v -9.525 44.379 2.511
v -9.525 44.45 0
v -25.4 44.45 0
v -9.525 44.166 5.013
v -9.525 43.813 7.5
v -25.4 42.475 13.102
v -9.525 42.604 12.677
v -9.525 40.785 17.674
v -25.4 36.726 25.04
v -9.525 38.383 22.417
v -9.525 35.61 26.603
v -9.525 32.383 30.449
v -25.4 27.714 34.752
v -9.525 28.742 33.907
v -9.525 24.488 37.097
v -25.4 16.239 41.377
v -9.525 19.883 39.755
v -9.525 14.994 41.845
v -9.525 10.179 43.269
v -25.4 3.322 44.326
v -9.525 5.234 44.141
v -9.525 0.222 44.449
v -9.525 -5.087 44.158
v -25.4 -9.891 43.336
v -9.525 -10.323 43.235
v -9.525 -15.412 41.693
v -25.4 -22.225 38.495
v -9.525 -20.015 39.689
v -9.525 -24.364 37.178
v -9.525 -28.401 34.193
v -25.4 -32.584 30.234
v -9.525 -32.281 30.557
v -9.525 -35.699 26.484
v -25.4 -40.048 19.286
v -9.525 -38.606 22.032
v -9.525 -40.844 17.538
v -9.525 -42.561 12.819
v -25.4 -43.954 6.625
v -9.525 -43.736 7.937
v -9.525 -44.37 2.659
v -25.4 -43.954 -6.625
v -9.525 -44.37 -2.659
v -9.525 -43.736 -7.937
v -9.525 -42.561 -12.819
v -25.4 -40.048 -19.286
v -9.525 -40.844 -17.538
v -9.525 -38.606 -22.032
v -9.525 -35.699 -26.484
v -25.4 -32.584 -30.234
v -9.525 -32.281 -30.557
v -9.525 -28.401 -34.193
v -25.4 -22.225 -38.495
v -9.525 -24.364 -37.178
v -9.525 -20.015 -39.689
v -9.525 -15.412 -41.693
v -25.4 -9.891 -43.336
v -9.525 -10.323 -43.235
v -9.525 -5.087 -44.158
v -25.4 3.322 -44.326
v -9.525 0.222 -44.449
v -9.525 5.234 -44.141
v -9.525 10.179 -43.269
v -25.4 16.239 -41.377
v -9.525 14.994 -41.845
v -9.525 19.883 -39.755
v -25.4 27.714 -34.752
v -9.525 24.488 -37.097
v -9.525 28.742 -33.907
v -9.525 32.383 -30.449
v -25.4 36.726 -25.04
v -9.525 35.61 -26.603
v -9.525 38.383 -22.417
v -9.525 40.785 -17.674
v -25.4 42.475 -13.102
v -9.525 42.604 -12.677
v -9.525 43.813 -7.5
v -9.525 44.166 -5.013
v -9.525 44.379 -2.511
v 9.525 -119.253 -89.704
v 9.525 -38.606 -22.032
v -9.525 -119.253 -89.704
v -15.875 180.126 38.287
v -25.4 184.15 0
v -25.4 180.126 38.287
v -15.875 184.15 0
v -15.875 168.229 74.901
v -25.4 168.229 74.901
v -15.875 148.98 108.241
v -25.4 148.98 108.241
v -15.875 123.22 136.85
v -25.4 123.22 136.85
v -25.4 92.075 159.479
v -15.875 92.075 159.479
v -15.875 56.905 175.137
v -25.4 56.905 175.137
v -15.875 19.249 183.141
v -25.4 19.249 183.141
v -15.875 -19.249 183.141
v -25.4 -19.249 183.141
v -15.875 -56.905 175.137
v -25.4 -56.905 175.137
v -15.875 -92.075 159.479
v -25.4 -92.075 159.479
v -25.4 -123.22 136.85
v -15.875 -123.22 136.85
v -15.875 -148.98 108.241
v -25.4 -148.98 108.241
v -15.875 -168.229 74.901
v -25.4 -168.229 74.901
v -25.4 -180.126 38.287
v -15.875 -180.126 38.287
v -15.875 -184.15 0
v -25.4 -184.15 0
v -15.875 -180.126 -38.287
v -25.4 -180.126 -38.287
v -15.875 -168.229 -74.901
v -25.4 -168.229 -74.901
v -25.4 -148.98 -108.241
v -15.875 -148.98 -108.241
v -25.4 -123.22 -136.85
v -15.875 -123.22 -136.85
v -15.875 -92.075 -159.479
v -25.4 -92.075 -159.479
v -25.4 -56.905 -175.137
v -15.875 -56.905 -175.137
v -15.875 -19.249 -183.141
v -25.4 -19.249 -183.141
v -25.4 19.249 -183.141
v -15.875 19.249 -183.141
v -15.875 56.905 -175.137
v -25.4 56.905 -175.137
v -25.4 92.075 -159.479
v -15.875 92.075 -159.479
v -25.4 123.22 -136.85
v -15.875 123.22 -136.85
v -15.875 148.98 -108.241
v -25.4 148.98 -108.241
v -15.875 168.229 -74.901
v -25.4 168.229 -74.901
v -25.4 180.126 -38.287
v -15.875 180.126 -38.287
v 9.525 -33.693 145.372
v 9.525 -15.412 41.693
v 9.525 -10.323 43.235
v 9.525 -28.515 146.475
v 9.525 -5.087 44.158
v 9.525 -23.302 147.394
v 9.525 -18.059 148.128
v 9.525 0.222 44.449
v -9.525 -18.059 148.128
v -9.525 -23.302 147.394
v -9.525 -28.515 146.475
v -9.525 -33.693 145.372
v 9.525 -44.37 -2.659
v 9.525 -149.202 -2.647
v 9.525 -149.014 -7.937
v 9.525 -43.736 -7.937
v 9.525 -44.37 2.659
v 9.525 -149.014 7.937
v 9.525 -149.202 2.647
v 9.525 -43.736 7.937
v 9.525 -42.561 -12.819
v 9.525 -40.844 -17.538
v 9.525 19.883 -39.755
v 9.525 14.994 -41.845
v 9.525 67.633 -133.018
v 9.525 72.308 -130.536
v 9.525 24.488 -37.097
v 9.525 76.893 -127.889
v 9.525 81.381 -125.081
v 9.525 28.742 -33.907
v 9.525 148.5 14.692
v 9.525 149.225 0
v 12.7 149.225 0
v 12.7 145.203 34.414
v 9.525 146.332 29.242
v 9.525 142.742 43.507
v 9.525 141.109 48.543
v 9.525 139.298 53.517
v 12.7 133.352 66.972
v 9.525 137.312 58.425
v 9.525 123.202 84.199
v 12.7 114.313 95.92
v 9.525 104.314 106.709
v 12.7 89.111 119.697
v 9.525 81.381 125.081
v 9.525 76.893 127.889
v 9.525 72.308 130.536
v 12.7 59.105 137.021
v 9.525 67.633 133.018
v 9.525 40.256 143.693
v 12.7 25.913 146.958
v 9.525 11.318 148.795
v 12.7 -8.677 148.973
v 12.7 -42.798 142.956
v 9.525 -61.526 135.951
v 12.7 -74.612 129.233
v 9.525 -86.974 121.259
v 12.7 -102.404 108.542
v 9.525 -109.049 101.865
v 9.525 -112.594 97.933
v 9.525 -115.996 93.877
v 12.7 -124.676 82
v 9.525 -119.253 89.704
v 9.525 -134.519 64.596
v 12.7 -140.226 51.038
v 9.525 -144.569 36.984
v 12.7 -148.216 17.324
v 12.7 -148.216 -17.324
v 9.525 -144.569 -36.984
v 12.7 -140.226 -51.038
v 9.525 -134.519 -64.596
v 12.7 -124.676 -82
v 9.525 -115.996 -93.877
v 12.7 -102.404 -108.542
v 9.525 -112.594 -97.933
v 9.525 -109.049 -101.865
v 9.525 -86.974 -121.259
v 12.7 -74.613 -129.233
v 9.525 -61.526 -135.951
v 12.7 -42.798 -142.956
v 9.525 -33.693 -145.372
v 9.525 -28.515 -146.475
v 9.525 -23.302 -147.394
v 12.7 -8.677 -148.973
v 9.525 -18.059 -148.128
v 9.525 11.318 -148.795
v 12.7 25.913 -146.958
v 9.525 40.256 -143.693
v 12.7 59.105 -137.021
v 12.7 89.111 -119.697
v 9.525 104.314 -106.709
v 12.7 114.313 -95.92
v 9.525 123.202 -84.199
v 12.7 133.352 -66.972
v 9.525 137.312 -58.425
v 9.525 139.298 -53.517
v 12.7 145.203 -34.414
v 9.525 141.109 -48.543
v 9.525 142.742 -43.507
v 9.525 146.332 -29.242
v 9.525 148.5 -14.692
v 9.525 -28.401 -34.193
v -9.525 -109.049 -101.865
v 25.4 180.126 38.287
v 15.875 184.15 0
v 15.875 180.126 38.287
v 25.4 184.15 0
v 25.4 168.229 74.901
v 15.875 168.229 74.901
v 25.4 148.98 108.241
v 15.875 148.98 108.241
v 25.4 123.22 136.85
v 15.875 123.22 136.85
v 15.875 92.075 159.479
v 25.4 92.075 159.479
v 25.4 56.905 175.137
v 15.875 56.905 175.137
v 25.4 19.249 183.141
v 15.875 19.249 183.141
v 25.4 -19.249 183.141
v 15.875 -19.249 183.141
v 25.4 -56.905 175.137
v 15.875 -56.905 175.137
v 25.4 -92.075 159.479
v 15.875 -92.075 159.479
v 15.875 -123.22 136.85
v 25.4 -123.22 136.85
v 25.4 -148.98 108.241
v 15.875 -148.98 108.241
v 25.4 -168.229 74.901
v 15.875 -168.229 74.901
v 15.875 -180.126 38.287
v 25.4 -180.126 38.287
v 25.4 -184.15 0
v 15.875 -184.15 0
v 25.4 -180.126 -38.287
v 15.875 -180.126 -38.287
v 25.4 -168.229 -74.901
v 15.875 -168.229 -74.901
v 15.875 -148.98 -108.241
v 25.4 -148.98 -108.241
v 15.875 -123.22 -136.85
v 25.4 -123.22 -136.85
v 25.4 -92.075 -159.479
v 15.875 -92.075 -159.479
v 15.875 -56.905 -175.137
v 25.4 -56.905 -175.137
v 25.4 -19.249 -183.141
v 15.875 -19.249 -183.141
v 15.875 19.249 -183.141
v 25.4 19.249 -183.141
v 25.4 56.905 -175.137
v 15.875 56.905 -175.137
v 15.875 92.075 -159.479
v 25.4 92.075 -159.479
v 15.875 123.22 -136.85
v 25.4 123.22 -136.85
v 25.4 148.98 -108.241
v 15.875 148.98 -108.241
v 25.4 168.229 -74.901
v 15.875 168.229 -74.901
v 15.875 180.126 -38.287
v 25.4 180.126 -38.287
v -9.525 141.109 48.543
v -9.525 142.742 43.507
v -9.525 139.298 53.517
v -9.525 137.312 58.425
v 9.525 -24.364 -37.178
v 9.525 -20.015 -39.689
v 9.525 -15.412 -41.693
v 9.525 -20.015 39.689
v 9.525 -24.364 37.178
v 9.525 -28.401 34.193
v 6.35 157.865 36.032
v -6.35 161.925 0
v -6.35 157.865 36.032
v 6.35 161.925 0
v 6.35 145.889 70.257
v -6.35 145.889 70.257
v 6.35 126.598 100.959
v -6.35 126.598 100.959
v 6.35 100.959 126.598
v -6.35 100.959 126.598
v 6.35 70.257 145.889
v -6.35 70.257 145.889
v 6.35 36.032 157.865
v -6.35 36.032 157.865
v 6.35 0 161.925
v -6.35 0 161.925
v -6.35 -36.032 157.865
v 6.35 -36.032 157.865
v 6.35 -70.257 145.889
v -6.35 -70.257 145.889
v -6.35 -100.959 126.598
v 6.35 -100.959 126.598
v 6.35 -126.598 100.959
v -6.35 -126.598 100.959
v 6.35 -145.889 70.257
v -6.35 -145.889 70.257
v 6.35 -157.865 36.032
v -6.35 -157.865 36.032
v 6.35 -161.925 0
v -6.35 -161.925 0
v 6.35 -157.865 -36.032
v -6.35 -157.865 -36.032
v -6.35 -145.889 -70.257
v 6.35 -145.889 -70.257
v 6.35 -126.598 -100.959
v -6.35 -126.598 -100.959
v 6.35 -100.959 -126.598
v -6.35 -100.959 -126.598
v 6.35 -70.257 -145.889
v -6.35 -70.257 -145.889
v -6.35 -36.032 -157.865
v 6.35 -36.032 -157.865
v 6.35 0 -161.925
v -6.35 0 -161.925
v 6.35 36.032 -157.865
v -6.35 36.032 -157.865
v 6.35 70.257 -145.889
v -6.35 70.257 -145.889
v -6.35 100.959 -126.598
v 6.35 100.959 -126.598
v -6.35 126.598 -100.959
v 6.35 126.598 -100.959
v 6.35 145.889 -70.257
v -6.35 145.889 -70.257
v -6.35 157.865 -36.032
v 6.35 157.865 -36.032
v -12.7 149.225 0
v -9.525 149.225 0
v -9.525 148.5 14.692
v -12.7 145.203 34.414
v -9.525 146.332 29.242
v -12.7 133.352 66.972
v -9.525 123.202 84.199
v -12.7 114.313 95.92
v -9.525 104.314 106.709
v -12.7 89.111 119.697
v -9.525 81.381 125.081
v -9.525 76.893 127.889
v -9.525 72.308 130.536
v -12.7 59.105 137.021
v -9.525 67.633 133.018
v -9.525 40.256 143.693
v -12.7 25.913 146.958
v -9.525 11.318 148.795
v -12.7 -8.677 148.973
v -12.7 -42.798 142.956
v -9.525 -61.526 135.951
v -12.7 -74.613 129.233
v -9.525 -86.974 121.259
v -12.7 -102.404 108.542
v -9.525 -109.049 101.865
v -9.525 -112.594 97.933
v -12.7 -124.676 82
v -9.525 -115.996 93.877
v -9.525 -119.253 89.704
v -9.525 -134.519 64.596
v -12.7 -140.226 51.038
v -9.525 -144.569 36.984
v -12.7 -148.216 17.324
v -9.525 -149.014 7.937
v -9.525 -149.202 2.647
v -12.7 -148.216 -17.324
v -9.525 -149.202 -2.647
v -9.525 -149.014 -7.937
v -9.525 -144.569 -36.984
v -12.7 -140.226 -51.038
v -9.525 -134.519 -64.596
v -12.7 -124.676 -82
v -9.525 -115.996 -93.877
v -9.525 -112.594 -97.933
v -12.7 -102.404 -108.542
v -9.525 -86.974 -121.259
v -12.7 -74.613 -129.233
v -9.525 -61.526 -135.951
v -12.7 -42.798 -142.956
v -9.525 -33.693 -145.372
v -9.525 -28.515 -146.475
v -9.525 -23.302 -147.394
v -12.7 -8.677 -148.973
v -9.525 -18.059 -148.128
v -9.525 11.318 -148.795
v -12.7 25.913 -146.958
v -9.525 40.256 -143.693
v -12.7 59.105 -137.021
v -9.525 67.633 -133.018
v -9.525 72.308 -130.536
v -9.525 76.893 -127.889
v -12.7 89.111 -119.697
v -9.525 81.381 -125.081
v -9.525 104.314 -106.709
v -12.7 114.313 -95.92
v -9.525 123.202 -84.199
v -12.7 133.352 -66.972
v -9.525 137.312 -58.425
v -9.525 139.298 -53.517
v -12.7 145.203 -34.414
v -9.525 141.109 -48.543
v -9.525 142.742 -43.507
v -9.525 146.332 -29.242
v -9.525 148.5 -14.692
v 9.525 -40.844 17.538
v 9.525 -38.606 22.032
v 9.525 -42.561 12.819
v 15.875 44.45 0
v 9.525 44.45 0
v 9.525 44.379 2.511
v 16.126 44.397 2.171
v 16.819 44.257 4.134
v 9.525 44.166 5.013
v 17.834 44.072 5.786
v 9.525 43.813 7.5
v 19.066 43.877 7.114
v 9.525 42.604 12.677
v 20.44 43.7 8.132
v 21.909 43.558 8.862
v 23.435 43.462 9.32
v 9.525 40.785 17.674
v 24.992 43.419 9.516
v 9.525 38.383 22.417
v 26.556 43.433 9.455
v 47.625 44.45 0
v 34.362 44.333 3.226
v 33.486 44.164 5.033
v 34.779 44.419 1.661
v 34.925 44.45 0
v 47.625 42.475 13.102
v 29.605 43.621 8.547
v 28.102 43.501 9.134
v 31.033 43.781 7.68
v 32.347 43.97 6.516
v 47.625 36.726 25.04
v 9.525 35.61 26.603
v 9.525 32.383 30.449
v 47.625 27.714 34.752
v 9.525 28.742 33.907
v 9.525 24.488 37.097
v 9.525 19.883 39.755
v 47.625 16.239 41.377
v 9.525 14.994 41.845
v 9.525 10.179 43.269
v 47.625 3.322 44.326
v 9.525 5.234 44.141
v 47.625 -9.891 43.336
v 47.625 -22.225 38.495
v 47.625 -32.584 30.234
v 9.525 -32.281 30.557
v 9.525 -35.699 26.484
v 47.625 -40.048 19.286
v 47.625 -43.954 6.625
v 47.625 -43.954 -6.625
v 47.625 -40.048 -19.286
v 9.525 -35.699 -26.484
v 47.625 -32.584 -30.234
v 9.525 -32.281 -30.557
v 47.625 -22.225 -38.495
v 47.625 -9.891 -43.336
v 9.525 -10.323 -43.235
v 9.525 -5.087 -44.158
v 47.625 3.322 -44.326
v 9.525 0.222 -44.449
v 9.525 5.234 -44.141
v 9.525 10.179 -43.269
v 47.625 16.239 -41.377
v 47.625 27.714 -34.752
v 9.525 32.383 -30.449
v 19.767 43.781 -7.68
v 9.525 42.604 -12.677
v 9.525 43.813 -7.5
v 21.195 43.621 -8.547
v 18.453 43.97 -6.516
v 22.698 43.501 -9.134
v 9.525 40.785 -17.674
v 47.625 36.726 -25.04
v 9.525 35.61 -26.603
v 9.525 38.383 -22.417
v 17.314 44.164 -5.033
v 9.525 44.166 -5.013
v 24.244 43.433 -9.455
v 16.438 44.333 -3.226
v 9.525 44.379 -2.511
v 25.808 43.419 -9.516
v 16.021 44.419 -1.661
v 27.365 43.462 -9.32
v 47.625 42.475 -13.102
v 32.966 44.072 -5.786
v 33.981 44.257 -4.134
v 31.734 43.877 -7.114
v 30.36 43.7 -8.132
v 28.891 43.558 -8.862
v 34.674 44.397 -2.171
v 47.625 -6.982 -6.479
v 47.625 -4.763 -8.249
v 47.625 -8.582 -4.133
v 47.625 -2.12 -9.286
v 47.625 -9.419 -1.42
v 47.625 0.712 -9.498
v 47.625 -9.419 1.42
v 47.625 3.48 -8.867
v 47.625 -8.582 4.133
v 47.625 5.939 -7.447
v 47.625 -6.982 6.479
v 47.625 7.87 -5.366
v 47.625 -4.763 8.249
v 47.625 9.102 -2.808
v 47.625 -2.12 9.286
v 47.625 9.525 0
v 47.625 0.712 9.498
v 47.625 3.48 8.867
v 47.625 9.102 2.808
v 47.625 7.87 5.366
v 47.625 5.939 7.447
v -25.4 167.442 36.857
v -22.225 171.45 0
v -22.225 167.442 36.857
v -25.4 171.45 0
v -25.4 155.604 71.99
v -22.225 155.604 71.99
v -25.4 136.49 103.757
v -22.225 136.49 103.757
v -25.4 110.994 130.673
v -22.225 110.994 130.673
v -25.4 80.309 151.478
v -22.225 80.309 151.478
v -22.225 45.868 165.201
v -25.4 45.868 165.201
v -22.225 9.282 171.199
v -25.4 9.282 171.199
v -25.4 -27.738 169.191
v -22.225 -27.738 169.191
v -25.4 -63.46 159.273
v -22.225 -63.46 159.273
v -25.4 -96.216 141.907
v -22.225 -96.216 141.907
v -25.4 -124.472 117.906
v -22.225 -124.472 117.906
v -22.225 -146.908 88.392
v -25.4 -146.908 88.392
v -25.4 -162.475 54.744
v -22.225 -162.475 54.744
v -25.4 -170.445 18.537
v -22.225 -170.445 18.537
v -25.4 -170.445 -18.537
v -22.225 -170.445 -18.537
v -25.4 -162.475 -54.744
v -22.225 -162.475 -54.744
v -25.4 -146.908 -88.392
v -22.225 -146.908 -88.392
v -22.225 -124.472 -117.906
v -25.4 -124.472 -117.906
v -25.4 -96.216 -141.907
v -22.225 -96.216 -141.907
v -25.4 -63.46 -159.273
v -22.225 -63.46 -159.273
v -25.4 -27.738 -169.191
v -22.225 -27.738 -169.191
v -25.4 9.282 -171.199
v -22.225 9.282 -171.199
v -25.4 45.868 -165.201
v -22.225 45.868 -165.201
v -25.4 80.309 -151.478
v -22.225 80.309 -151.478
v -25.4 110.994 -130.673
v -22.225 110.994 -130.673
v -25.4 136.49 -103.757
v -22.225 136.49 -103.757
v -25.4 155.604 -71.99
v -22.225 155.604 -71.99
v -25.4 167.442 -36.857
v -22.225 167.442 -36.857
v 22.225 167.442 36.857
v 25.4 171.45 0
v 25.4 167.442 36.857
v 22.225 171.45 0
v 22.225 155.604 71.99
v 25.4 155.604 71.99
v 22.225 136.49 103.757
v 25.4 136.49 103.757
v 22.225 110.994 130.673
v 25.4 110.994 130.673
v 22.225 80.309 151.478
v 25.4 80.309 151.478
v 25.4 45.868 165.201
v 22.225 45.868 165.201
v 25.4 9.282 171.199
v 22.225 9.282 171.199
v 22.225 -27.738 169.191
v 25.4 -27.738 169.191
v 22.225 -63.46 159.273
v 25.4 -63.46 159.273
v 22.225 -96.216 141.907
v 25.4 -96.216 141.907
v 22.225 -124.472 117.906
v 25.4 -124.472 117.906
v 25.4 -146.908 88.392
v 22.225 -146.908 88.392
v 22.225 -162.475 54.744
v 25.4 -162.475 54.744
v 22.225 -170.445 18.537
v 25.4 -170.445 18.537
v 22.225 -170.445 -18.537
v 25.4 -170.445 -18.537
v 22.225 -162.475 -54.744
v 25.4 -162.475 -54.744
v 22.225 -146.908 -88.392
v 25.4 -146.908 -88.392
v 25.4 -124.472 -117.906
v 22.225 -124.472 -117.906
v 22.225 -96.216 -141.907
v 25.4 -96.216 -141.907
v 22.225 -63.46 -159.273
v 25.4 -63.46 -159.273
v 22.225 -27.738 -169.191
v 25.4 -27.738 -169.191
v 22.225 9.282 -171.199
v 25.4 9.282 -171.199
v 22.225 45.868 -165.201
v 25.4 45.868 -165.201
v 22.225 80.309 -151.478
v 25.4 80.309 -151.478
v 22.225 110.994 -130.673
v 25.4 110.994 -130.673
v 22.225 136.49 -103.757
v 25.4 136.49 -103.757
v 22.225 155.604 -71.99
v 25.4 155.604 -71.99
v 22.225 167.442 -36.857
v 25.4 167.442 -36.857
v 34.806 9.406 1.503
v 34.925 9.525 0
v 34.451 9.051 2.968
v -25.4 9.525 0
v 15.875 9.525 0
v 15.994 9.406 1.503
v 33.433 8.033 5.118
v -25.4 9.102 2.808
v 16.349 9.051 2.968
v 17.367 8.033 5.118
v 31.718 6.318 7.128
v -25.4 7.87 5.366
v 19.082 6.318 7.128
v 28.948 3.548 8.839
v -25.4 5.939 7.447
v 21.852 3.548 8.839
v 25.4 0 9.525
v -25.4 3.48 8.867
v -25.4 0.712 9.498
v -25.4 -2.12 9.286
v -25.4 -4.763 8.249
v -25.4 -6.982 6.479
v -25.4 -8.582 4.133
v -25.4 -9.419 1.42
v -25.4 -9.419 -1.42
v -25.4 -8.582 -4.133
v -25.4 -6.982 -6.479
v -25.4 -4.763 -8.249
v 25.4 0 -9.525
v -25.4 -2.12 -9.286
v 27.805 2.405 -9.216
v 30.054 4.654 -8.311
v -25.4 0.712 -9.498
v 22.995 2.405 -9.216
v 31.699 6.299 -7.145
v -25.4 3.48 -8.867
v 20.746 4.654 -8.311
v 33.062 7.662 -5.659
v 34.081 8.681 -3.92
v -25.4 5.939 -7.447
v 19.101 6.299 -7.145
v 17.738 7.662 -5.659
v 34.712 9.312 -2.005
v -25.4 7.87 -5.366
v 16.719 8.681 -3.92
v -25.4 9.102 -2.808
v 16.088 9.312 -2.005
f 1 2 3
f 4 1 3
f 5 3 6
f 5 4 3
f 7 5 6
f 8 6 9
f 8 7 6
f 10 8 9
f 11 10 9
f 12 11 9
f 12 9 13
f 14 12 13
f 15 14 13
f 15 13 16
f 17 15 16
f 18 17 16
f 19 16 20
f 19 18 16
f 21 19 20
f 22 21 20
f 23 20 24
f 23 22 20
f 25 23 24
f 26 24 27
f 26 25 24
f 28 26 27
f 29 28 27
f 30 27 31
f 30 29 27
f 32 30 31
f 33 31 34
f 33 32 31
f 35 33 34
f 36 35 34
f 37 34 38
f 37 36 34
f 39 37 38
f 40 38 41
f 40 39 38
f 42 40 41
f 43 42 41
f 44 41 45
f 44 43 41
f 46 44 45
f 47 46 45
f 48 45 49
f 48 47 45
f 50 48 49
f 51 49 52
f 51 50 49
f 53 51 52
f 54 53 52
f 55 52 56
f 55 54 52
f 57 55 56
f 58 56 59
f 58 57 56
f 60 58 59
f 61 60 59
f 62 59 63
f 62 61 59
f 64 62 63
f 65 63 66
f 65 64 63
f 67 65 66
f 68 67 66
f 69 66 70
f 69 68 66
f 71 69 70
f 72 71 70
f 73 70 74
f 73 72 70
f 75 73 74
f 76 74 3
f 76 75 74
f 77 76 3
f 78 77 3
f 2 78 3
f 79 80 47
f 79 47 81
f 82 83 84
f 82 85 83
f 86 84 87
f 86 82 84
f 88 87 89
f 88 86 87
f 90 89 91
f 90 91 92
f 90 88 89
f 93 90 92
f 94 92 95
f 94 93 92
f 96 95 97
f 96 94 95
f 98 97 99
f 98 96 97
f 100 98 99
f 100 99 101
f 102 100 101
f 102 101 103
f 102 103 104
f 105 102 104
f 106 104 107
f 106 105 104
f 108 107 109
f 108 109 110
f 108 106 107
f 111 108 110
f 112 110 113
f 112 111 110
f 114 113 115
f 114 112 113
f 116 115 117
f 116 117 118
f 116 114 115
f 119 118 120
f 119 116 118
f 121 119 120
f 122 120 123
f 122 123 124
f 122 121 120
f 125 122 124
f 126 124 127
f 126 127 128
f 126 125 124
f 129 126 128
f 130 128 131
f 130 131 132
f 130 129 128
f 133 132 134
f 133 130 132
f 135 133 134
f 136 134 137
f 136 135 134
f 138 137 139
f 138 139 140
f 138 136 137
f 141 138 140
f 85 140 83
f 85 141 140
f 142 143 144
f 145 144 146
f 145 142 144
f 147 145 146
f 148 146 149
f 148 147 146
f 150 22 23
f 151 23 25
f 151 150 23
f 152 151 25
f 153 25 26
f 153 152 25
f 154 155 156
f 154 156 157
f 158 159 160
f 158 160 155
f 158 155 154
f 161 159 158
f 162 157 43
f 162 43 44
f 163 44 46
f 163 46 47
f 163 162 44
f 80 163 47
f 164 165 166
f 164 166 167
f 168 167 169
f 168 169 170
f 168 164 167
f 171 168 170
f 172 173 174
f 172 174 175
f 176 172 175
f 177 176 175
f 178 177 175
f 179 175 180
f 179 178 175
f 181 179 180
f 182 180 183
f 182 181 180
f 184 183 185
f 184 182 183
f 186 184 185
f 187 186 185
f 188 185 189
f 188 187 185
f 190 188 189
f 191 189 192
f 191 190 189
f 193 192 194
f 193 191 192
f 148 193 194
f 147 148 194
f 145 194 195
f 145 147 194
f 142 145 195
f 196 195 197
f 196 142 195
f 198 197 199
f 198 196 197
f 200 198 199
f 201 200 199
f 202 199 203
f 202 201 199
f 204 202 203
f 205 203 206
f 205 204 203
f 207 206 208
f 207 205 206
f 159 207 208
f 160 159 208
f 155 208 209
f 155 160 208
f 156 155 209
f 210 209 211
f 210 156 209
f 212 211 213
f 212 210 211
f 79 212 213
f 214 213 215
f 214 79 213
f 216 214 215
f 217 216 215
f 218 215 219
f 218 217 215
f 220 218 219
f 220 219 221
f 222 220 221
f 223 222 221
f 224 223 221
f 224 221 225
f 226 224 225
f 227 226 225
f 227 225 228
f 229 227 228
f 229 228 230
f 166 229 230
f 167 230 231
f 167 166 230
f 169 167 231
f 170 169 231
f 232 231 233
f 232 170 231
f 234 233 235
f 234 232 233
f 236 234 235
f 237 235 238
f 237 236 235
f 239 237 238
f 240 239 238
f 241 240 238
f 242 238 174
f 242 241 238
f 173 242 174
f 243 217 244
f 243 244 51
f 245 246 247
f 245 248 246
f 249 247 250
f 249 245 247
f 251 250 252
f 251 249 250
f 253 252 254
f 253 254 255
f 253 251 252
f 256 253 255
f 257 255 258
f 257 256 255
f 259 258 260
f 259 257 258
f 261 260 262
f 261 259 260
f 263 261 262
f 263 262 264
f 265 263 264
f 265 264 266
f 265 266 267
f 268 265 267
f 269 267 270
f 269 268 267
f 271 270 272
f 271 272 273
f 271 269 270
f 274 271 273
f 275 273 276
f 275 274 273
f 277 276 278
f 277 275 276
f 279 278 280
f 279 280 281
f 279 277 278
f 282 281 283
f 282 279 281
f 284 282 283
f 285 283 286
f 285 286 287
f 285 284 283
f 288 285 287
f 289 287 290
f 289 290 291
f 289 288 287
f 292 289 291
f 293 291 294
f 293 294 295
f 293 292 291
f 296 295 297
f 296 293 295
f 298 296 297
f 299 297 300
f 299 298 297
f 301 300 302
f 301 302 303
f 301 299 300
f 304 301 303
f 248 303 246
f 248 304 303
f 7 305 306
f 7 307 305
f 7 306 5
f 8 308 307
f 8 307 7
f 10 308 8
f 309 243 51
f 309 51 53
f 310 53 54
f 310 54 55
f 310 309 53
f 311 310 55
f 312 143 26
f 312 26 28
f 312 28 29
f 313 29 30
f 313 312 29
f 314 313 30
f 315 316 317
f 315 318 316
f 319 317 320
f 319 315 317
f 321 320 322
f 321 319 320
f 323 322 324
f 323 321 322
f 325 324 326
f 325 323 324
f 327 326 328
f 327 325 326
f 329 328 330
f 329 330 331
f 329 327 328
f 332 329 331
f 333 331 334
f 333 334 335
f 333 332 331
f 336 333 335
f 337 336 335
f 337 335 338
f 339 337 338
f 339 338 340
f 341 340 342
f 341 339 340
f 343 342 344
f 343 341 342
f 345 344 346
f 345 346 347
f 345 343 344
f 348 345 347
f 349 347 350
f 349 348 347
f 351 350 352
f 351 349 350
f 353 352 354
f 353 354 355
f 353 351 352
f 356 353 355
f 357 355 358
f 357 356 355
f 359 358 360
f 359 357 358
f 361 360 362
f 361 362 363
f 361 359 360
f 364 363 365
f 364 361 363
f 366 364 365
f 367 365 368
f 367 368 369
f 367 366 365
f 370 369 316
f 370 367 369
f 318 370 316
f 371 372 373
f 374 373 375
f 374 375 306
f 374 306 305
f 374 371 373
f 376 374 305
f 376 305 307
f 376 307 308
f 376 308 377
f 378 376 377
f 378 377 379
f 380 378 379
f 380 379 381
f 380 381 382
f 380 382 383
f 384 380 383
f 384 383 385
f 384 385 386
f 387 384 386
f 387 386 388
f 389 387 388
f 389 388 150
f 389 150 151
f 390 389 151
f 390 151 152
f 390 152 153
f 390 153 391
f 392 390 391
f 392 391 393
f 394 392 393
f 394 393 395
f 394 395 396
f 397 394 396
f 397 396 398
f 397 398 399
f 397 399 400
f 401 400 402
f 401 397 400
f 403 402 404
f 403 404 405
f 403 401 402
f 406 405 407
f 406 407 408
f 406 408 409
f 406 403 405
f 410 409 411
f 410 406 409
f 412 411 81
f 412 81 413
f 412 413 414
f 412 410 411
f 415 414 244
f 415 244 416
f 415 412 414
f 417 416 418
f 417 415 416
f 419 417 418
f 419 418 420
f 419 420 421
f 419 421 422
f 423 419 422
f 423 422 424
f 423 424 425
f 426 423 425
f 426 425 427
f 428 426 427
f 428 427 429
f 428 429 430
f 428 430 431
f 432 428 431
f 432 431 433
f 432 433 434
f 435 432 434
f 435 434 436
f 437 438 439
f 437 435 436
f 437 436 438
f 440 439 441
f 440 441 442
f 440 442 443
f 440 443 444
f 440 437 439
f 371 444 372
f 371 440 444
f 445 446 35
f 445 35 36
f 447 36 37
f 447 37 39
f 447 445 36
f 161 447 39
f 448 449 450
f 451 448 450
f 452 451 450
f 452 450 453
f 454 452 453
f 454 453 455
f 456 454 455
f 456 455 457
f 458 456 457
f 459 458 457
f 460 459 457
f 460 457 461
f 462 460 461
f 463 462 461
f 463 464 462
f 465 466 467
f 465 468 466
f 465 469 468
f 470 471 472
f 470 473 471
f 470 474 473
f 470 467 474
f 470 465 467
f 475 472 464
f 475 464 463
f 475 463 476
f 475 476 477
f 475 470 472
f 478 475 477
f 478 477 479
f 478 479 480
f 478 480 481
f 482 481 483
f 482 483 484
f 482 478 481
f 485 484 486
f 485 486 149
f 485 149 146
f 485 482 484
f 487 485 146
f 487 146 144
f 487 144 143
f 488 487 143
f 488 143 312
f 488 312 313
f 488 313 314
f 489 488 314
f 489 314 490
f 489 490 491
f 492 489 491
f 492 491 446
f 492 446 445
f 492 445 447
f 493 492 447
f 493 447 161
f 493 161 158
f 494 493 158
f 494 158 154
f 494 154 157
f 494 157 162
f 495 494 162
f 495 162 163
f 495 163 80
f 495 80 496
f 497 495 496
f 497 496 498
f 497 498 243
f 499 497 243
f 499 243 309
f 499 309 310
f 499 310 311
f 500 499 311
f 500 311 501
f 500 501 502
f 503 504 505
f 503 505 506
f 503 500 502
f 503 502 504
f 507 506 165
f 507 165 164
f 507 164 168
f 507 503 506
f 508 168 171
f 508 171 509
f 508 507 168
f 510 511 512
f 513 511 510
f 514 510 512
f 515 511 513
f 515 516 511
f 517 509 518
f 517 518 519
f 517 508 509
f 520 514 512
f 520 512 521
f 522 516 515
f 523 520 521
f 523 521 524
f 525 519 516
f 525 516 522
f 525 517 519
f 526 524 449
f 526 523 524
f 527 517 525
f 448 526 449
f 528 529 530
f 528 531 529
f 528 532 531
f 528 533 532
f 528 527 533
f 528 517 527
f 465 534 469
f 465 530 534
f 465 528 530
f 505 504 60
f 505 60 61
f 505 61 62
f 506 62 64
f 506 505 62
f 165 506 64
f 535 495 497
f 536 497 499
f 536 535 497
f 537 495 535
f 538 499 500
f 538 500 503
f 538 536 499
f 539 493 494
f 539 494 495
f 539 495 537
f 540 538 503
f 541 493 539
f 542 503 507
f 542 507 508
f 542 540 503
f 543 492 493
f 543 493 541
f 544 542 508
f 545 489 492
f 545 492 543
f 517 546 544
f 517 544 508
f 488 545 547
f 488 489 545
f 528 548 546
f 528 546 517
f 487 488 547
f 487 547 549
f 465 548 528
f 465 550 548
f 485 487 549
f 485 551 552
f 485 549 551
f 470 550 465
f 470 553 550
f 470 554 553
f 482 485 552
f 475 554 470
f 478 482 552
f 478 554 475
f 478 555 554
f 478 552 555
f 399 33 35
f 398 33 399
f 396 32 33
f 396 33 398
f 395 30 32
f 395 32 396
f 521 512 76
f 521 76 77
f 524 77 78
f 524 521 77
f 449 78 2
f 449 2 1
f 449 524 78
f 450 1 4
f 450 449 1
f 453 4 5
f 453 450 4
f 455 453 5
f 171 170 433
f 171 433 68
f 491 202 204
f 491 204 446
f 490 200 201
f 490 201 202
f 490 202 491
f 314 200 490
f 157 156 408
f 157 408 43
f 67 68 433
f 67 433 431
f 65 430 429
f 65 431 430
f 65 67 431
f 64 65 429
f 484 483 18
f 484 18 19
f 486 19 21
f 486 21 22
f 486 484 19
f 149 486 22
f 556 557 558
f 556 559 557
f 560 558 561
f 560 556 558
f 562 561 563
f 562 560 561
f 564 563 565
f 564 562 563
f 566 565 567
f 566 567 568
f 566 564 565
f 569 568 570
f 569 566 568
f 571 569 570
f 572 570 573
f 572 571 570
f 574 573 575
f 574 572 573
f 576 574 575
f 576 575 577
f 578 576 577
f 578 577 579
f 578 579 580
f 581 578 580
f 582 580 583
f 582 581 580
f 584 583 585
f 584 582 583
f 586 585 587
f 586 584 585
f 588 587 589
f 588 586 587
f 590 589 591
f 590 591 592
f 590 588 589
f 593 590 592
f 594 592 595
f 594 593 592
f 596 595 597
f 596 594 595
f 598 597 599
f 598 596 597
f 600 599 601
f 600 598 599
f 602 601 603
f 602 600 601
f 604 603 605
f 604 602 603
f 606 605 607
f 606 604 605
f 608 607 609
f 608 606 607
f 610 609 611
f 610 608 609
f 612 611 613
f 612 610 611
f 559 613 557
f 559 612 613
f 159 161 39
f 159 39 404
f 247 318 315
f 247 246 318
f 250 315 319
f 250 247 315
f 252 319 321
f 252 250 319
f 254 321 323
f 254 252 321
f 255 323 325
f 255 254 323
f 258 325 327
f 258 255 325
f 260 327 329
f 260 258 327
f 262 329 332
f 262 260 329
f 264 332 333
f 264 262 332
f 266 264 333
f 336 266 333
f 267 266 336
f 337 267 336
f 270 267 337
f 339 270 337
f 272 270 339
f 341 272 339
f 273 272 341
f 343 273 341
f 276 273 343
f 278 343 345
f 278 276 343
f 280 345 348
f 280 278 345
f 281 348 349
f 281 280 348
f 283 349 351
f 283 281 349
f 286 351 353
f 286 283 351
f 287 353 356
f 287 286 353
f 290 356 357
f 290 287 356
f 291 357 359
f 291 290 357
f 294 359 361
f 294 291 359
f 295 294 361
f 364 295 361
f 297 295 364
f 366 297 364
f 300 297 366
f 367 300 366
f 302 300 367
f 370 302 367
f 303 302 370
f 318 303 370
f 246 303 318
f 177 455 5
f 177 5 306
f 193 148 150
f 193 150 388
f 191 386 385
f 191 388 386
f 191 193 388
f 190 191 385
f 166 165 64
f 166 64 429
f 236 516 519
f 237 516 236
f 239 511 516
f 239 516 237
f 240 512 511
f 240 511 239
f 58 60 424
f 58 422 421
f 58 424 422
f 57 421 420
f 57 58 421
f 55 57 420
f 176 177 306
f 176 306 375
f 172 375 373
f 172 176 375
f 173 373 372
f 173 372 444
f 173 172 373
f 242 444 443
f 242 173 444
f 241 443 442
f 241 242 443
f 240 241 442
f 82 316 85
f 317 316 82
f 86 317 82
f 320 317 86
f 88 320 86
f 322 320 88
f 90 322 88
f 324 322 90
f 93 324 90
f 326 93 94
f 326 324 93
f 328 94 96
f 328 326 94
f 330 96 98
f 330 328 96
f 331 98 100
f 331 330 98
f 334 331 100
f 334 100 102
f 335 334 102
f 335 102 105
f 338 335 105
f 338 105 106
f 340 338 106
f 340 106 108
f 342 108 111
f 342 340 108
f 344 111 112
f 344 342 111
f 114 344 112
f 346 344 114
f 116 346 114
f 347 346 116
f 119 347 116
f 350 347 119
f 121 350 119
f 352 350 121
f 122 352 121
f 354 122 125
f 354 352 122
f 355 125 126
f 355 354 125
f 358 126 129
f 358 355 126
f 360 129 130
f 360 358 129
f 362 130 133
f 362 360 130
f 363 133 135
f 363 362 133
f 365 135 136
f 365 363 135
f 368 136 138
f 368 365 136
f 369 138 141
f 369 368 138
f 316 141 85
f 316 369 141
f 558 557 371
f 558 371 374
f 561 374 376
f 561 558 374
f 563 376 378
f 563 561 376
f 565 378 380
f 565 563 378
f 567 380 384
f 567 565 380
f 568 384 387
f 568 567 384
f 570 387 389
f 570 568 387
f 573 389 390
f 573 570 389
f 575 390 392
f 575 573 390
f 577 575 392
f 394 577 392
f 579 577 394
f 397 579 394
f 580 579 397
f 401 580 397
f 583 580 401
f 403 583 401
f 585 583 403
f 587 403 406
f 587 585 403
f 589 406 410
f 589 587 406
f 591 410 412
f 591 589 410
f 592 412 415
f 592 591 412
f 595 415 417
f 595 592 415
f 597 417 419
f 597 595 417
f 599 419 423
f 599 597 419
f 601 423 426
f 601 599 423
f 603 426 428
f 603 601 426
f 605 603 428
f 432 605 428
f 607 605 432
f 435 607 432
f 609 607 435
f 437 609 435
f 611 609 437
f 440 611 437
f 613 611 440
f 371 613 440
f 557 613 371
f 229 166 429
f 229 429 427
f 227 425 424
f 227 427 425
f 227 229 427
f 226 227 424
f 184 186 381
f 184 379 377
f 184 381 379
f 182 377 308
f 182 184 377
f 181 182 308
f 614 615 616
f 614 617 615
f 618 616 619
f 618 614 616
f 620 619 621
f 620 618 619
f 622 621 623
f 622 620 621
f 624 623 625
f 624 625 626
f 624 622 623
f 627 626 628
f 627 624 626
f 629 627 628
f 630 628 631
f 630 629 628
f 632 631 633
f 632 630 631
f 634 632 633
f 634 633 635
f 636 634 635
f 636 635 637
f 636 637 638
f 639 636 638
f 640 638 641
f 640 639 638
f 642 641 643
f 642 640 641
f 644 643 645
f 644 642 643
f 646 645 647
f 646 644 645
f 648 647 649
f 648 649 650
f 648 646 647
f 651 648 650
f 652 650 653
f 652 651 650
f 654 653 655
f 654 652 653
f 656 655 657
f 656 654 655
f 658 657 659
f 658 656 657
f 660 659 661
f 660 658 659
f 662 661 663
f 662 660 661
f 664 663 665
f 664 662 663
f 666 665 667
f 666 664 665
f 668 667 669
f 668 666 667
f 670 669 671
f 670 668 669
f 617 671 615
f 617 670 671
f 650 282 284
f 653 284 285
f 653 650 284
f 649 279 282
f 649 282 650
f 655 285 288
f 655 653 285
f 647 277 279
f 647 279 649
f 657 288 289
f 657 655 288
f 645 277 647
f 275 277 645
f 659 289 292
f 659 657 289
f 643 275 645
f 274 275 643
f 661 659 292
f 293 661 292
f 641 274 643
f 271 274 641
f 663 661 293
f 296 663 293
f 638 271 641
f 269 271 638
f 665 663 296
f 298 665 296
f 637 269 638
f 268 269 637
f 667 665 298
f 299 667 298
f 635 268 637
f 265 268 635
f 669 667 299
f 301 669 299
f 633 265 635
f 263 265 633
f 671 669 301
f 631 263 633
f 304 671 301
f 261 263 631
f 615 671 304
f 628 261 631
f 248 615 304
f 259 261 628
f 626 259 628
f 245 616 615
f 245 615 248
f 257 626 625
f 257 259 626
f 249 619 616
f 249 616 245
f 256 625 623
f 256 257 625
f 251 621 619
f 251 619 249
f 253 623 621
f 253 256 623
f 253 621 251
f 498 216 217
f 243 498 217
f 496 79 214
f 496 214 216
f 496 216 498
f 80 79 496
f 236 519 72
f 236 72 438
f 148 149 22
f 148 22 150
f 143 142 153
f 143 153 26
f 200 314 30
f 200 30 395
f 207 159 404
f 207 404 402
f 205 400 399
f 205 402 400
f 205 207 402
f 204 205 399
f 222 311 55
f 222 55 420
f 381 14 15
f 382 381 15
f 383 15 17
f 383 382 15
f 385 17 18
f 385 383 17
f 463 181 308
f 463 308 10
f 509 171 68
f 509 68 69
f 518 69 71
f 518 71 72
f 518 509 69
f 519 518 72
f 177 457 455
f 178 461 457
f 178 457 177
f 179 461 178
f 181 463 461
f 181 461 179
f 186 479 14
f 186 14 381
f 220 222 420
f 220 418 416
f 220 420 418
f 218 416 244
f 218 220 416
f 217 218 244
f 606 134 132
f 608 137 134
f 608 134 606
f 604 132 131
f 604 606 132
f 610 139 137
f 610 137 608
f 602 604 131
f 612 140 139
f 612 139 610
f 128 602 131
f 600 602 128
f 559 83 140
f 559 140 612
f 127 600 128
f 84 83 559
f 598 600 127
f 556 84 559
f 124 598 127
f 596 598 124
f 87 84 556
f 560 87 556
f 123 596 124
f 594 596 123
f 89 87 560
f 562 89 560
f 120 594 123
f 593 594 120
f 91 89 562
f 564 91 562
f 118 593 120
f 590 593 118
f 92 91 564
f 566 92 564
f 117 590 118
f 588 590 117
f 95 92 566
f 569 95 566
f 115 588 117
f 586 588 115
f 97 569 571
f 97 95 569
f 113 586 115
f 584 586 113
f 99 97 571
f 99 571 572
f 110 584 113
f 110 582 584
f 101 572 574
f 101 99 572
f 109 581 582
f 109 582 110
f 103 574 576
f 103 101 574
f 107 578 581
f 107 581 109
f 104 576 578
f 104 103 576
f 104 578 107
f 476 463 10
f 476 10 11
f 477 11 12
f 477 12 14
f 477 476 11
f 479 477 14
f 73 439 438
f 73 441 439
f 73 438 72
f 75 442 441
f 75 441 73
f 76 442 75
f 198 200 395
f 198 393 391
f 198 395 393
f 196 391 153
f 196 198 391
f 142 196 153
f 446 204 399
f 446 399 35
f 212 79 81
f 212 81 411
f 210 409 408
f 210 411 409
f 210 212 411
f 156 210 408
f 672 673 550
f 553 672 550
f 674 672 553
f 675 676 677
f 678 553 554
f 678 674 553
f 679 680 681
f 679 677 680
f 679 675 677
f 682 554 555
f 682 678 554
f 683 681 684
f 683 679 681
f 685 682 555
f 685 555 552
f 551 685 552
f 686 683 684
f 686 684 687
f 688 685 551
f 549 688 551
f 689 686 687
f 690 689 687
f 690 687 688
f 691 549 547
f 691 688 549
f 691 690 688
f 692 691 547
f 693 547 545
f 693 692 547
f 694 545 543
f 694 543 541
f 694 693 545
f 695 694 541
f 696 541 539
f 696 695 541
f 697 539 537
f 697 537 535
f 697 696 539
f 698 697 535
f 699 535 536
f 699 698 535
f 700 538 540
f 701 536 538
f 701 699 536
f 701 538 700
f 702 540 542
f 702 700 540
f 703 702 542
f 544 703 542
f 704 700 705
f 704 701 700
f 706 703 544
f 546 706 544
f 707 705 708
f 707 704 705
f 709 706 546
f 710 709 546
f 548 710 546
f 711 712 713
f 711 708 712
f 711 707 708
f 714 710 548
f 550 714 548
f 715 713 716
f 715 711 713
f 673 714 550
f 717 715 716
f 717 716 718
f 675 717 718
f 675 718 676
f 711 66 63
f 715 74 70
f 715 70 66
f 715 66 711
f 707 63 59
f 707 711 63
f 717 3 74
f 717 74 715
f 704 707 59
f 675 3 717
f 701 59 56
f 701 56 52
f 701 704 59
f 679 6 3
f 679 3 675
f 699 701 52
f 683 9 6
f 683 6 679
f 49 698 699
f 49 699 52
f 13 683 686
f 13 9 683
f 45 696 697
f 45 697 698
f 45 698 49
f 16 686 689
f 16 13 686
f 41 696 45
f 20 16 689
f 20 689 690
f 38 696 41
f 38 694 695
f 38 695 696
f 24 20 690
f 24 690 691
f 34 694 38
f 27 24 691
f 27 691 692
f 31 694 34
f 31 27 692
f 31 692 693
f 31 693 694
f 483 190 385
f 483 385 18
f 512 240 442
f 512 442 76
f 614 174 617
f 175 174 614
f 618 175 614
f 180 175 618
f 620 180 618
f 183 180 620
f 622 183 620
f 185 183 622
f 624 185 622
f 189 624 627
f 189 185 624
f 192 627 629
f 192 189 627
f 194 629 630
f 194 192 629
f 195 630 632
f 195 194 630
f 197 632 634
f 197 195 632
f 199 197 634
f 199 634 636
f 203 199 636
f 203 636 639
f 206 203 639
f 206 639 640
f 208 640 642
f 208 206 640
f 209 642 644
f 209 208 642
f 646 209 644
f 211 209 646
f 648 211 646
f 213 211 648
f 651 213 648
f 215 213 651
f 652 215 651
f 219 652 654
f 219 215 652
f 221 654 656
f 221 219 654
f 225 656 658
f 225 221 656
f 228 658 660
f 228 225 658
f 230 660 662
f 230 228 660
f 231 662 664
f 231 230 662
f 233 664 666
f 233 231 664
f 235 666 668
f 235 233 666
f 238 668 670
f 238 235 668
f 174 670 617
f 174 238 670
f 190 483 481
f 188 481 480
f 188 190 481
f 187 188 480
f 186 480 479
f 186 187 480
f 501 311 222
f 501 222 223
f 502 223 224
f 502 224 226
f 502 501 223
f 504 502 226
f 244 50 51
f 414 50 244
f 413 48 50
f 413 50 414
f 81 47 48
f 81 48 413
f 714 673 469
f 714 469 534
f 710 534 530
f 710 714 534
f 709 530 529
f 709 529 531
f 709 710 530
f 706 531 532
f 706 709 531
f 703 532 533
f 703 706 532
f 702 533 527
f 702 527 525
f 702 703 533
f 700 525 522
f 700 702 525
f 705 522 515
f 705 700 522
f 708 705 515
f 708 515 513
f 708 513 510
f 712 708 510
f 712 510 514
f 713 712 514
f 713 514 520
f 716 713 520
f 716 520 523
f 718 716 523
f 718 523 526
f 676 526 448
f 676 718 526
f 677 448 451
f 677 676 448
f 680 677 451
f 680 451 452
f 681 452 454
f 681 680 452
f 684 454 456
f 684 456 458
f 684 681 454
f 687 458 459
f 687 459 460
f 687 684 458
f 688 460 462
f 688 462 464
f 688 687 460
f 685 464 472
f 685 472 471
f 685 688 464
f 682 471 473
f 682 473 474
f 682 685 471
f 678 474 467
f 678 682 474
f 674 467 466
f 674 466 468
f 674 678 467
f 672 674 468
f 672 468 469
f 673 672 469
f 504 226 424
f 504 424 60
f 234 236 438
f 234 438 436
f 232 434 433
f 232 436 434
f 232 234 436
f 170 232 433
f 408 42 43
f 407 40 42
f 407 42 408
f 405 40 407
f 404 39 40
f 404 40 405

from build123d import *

# Parameters (mm, degrees)
CUT_EXTRUDE1_DEPTH = 35.925
CIRPATTERN2_COUNT  = 9
CUT_EXTRUDE2_START = -44.45
SKETCH3_R          = 9.525
CUT_EXTRUDE2_DEPTH = 44.45


with BuildPart() as part:
    # Sketch1 → Revolve2 (revolve)
    with BuildSketch(Plane.XY):
        Polygon((47.625, 9.525), (-25.4, 9.525), (-25.4, 44.45), (-9.525, 44.45), (-9.525, 149.225), (-12.7, 149.225), (-22.225, 171.45), (-25.4, 171.45), (-25.4, 184.15), (-15.875, 184.15), (-6.35, 161.925), (6.35, 161.925), (15.875, 184.15), (25.4, 184.15), (25.4, 171.45), (22.225, 171.45), (12.7, 149.225), (9.525, 149.225), (9.525, 44.45), (47.625, 44.45), align=None)
    revolve(axis=Axis((-229.110116, 0, 0), (1, 0, 0)))

    # Sketch2 → Cut-Extrude1 (cut, through all)
    with BuildSketch(Plane(origin=(9.525, 0, 0), x_dir=(0, 0, -1), z_dir=(1, 0, 0))):
        with BuildLine():
            Line((-7.49963, 43.812761), (-43.506893, 142.741903))
            ThreePointArc((-43.506893, 142.741903), (0, 149.225), (43.506893, 142.741903))
            Line((43.506893, 142.741903), (7.49963, 43.812761))
            ThreePointArc((7.49963, 43.812761), (0, 44.45), (-7.49963, 43.812761))
        make_face()
    cut_extrude1 = extrude(amount=-CUT_EXTRUDE1_DEPTH, mode=Mode.SUBTRACT)

    # CirPattern2: Cut-Extrude1 ×9 about axis
    cirpattern2_axis = Axis((0, 0, 0), (1, 0, 0))
    for i in range(1, CIRPATTERN2_COUNT):
        add(cut_extrude1.rotate(cirpattern2_axis, i * 360 / CIRPATTERN2_COUNT), mode=Mode.SUBTRACT)

    # Sketch3 → Cut-Extrude2 (cut)
    with BuildSketch(Plane(origin=(0, 44.45, 0), x_dir=(1, 0, 0), z_dir=(0, 1, 0)).offset(CUT_EXTRUDE2_START)):
        with Locations((25.4, 0)):
            Circle(SKETCH3_R)
    extrude(amount=CUT_EXTRUDE2_DEPTH, mode=Mode.SUBTRACT)


solid = part.part
